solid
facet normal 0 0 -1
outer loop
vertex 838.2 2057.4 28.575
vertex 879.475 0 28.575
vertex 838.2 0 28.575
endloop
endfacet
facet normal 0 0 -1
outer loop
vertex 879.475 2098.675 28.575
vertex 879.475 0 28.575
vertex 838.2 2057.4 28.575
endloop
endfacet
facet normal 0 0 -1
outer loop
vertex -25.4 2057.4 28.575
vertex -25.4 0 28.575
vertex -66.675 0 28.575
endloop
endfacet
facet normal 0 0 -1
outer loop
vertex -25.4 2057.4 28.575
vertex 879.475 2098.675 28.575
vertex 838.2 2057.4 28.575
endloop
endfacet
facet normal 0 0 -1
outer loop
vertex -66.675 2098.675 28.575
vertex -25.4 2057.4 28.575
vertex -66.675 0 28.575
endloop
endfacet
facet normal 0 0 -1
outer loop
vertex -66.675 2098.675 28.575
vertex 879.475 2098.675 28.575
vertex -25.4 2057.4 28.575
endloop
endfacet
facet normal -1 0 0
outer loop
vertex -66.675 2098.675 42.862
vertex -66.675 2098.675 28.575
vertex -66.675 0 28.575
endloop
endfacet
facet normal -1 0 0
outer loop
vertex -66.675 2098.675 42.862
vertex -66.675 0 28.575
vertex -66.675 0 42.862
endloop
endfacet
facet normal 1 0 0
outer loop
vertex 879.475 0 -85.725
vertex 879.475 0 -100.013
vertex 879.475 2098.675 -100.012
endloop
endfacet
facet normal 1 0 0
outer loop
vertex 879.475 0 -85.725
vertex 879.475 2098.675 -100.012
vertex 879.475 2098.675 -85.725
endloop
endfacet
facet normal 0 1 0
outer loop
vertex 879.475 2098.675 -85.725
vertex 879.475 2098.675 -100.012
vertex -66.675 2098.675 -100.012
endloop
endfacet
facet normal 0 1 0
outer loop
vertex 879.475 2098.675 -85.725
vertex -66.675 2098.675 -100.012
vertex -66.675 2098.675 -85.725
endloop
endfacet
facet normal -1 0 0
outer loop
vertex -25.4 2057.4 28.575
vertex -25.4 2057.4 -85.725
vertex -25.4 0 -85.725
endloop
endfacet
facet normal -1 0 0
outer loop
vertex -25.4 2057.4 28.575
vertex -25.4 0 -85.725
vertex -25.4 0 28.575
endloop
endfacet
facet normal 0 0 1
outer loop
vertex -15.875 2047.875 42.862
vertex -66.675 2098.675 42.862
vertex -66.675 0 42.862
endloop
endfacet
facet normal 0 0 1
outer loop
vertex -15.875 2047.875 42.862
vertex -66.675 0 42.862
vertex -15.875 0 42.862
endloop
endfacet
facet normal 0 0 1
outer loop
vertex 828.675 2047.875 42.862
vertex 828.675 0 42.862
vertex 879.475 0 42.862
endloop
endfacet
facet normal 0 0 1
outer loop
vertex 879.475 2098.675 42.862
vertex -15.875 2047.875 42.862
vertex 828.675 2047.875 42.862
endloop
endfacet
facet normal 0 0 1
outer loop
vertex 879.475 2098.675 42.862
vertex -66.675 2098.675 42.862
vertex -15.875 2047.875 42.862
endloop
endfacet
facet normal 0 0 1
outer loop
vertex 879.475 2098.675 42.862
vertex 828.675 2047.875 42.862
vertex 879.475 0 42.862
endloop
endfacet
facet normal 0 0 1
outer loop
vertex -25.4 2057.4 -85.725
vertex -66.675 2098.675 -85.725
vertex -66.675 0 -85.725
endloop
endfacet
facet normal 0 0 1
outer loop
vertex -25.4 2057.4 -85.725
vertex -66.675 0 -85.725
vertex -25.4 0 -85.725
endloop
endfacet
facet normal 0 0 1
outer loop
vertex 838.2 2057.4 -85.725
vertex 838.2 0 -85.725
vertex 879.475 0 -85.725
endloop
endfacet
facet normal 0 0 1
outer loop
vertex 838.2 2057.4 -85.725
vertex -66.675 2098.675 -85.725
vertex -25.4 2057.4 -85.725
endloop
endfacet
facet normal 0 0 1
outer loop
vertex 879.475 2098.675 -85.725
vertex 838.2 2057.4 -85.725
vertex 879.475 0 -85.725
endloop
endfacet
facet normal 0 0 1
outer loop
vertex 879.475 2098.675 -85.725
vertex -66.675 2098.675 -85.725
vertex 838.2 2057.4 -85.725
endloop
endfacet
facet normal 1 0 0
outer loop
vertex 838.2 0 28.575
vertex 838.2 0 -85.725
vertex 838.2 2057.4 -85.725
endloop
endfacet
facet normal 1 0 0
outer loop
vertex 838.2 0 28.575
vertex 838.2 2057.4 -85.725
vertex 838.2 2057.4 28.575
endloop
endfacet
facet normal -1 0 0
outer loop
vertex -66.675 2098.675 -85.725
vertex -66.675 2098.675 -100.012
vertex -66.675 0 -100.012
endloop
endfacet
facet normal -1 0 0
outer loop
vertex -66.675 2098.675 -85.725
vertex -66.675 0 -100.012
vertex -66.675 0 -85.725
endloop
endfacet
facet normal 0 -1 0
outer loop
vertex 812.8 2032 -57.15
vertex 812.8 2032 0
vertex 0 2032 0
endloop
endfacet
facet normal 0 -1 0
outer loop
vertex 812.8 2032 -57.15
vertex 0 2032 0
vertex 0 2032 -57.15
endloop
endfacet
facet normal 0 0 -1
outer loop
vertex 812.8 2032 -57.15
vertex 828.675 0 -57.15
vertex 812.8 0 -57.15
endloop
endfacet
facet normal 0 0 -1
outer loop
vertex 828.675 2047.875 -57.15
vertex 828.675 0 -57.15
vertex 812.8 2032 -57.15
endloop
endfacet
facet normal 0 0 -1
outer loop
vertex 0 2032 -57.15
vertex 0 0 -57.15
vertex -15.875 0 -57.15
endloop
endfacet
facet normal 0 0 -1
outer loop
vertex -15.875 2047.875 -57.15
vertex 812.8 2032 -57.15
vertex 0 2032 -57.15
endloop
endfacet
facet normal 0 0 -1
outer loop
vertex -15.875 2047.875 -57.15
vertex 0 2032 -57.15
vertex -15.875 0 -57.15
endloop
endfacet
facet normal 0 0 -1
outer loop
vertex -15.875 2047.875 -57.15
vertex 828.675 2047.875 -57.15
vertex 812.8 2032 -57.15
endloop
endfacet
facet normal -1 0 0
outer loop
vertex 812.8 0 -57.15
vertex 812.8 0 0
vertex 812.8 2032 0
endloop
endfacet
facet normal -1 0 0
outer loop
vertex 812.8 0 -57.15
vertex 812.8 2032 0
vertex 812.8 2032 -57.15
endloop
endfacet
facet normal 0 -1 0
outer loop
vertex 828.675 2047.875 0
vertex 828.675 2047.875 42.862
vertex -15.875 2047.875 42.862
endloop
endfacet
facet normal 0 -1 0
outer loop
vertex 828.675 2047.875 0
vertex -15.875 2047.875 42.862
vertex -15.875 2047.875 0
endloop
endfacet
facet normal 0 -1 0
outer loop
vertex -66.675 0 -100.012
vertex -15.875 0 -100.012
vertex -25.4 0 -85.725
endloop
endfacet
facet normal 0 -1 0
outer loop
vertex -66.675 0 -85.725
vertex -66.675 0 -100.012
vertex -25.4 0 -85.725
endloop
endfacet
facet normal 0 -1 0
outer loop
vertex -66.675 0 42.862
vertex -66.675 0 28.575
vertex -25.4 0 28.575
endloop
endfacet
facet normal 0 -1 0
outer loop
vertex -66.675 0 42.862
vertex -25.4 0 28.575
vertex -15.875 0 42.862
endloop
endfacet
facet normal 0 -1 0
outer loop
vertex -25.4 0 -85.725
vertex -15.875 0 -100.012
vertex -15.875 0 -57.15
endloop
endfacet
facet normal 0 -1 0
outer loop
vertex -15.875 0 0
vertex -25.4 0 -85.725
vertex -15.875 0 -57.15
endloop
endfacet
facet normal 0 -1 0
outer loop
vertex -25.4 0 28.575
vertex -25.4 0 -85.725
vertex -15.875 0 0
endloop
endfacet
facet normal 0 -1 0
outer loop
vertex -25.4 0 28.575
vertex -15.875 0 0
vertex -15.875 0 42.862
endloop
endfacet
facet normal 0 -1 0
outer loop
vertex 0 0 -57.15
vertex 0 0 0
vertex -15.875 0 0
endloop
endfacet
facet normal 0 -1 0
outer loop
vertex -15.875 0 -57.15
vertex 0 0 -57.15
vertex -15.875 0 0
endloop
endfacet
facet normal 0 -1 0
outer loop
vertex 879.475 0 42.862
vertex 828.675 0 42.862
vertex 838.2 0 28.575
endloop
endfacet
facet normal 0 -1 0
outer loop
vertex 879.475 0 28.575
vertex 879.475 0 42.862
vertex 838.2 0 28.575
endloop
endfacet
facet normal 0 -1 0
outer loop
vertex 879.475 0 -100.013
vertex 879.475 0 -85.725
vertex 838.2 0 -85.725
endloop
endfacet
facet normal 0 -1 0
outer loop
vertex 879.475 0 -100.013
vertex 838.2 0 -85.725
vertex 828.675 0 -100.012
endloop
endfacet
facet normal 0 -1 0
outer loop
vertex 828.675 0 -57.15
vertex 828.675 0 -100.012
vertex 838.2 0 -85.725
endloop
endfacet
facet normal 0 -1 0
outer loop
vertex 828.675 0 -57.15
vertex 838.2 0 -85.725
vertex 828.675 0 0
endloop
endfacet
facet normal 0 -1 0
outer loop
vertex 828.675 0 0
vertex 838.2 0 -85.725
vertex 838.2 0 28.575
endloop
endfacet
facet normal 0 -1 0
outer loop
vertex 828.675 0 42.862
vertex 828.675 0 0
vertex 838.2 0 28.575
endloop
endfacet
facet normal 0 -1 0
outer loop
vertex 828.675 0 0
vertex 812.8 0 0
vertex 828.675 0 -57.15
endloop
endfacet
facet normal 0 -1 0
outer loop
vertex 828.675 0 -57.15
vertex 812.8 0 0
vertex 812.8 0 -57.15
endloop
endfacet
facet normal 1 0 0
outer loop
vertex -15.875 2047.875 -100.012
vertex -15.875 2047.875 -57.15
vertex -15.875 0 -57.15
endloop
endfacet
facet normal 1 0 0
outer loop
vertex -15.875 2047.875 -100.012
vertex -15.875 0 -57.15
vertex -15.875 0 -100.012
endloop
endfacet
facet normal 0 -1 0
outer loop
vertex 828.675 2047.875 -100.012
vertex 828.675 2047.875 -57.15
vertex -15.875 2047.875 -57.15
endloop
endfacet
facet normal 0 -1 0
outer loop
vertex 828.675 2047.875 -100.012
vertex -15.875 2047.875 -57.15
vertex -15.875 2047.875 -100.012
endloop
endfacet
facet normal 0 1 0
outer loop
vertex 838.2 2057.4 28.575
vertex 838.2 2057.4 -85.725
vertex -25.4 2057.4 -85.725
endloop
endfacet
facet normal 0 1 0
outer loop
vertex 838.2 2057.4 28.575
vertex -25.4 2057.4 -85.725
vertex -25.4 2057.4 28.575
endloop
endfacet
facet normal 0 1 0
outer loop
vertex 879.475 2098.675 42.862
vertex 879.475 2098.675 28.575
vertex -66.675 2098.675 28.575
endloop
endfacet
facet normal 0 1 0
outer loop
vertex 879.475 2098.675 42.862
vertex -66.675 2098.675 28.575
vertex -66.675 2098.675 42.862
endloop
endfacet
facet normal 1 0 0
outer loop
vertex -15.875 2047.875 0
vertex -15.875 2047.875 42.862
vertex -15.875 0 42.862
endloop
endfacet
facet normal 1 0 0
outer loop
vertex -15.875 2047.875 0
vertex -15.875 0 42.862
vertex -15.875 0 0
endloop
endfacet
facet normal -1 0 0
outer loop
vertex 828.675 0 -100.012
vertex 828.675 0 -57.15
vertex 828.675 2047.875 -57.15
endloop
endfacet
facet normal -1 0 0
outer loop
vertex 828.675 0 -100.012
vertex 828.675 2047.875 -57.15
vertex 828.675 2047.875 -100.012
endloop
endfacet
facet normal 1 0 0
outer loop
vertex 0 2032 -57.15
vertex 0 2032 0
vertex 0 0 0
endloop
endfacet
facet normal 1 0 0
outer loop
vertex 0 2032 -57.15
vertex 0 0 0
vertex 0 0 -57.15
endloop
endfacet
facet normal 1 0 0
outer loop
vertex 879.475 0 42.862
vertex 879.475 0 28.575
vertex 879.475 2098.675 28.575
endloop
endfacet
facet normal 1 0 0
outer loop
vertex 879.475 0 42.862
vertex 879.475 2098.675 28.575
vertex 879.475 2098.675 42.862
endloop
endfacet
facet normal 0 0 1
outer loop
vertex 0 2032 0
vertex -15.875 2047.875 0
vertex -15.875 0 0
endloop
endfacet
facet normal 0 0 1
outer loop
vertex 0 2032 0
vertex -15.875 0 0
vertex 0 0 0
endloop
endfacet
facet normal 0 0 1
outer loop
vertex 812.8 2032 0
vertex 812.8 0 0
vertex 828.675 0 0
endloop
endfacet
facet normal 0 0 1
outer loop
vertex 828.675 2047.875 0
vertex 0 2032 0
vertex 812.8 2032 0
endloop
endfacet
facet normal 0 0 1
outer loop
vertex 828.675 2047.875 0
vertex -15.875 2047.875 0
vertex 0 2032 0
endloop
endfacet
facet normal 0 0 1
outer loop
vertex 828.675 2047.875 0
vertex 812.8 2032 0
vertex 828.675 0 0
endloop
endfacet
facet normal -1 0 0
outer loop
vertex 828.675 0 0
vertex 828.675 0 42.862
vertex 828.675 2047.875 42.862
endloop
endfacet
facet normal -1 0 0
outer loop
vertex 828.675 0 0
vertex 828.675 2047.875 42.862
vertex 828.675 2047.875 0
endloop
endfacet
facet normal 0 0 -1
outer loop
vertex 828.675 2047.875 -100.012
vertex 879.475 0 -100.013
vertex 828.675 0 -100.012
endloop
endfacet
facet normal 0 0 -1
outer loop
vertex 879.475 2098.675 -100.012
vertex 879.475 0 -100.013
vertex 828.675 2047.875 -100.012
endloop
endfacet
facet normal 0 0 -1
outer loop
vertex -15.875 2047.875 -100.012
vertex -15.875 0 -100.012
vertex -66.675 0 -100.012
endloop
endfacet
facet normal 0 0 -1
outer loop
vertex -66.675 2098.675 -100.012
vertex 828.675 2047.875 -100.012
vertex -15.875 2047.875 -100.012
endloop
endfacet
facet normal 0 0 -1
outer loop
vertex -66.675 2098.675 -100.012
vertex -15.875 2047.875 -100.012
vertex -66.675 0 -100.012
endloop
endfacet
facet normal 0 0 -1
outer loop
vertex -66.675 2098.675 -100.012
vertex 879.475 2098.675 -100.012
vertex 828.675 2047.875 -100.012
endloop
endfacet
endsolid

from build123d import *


with BuildPart() as part:
    # Sweep1: sweep along a path in Sketch1
    with BuildLine(Plane.XY) as sweep1_path:
        Line((0, 0), (0, 2032))
        Line((0, 2032), (812.8, 2032))
        Line((812.8, 2032), (812.8, 0))
    # Sketch2 → Sweep1 (sweep)
    with BuildSketch(Plane(origin=(0, 0, 0), x_dir=(1, 0, 0), z_dir=(0, 1, 0))):
        Polygon((0, 0), (0, 57.15), (-15.875, 57.15), (-15.875, 100.0125), (-66.675, 100.0125), (-66.675, 85.725), (-25.4, 85.725), (-25.4, -28.575), (-66.675, -28.575), (-66.675, -42.8625), (-15.875, -42.8625), (-15.875, 0), align=None)
    sweep(path=sweep1_path.line, transition=Transition.RIGHT)


solid = part.part
